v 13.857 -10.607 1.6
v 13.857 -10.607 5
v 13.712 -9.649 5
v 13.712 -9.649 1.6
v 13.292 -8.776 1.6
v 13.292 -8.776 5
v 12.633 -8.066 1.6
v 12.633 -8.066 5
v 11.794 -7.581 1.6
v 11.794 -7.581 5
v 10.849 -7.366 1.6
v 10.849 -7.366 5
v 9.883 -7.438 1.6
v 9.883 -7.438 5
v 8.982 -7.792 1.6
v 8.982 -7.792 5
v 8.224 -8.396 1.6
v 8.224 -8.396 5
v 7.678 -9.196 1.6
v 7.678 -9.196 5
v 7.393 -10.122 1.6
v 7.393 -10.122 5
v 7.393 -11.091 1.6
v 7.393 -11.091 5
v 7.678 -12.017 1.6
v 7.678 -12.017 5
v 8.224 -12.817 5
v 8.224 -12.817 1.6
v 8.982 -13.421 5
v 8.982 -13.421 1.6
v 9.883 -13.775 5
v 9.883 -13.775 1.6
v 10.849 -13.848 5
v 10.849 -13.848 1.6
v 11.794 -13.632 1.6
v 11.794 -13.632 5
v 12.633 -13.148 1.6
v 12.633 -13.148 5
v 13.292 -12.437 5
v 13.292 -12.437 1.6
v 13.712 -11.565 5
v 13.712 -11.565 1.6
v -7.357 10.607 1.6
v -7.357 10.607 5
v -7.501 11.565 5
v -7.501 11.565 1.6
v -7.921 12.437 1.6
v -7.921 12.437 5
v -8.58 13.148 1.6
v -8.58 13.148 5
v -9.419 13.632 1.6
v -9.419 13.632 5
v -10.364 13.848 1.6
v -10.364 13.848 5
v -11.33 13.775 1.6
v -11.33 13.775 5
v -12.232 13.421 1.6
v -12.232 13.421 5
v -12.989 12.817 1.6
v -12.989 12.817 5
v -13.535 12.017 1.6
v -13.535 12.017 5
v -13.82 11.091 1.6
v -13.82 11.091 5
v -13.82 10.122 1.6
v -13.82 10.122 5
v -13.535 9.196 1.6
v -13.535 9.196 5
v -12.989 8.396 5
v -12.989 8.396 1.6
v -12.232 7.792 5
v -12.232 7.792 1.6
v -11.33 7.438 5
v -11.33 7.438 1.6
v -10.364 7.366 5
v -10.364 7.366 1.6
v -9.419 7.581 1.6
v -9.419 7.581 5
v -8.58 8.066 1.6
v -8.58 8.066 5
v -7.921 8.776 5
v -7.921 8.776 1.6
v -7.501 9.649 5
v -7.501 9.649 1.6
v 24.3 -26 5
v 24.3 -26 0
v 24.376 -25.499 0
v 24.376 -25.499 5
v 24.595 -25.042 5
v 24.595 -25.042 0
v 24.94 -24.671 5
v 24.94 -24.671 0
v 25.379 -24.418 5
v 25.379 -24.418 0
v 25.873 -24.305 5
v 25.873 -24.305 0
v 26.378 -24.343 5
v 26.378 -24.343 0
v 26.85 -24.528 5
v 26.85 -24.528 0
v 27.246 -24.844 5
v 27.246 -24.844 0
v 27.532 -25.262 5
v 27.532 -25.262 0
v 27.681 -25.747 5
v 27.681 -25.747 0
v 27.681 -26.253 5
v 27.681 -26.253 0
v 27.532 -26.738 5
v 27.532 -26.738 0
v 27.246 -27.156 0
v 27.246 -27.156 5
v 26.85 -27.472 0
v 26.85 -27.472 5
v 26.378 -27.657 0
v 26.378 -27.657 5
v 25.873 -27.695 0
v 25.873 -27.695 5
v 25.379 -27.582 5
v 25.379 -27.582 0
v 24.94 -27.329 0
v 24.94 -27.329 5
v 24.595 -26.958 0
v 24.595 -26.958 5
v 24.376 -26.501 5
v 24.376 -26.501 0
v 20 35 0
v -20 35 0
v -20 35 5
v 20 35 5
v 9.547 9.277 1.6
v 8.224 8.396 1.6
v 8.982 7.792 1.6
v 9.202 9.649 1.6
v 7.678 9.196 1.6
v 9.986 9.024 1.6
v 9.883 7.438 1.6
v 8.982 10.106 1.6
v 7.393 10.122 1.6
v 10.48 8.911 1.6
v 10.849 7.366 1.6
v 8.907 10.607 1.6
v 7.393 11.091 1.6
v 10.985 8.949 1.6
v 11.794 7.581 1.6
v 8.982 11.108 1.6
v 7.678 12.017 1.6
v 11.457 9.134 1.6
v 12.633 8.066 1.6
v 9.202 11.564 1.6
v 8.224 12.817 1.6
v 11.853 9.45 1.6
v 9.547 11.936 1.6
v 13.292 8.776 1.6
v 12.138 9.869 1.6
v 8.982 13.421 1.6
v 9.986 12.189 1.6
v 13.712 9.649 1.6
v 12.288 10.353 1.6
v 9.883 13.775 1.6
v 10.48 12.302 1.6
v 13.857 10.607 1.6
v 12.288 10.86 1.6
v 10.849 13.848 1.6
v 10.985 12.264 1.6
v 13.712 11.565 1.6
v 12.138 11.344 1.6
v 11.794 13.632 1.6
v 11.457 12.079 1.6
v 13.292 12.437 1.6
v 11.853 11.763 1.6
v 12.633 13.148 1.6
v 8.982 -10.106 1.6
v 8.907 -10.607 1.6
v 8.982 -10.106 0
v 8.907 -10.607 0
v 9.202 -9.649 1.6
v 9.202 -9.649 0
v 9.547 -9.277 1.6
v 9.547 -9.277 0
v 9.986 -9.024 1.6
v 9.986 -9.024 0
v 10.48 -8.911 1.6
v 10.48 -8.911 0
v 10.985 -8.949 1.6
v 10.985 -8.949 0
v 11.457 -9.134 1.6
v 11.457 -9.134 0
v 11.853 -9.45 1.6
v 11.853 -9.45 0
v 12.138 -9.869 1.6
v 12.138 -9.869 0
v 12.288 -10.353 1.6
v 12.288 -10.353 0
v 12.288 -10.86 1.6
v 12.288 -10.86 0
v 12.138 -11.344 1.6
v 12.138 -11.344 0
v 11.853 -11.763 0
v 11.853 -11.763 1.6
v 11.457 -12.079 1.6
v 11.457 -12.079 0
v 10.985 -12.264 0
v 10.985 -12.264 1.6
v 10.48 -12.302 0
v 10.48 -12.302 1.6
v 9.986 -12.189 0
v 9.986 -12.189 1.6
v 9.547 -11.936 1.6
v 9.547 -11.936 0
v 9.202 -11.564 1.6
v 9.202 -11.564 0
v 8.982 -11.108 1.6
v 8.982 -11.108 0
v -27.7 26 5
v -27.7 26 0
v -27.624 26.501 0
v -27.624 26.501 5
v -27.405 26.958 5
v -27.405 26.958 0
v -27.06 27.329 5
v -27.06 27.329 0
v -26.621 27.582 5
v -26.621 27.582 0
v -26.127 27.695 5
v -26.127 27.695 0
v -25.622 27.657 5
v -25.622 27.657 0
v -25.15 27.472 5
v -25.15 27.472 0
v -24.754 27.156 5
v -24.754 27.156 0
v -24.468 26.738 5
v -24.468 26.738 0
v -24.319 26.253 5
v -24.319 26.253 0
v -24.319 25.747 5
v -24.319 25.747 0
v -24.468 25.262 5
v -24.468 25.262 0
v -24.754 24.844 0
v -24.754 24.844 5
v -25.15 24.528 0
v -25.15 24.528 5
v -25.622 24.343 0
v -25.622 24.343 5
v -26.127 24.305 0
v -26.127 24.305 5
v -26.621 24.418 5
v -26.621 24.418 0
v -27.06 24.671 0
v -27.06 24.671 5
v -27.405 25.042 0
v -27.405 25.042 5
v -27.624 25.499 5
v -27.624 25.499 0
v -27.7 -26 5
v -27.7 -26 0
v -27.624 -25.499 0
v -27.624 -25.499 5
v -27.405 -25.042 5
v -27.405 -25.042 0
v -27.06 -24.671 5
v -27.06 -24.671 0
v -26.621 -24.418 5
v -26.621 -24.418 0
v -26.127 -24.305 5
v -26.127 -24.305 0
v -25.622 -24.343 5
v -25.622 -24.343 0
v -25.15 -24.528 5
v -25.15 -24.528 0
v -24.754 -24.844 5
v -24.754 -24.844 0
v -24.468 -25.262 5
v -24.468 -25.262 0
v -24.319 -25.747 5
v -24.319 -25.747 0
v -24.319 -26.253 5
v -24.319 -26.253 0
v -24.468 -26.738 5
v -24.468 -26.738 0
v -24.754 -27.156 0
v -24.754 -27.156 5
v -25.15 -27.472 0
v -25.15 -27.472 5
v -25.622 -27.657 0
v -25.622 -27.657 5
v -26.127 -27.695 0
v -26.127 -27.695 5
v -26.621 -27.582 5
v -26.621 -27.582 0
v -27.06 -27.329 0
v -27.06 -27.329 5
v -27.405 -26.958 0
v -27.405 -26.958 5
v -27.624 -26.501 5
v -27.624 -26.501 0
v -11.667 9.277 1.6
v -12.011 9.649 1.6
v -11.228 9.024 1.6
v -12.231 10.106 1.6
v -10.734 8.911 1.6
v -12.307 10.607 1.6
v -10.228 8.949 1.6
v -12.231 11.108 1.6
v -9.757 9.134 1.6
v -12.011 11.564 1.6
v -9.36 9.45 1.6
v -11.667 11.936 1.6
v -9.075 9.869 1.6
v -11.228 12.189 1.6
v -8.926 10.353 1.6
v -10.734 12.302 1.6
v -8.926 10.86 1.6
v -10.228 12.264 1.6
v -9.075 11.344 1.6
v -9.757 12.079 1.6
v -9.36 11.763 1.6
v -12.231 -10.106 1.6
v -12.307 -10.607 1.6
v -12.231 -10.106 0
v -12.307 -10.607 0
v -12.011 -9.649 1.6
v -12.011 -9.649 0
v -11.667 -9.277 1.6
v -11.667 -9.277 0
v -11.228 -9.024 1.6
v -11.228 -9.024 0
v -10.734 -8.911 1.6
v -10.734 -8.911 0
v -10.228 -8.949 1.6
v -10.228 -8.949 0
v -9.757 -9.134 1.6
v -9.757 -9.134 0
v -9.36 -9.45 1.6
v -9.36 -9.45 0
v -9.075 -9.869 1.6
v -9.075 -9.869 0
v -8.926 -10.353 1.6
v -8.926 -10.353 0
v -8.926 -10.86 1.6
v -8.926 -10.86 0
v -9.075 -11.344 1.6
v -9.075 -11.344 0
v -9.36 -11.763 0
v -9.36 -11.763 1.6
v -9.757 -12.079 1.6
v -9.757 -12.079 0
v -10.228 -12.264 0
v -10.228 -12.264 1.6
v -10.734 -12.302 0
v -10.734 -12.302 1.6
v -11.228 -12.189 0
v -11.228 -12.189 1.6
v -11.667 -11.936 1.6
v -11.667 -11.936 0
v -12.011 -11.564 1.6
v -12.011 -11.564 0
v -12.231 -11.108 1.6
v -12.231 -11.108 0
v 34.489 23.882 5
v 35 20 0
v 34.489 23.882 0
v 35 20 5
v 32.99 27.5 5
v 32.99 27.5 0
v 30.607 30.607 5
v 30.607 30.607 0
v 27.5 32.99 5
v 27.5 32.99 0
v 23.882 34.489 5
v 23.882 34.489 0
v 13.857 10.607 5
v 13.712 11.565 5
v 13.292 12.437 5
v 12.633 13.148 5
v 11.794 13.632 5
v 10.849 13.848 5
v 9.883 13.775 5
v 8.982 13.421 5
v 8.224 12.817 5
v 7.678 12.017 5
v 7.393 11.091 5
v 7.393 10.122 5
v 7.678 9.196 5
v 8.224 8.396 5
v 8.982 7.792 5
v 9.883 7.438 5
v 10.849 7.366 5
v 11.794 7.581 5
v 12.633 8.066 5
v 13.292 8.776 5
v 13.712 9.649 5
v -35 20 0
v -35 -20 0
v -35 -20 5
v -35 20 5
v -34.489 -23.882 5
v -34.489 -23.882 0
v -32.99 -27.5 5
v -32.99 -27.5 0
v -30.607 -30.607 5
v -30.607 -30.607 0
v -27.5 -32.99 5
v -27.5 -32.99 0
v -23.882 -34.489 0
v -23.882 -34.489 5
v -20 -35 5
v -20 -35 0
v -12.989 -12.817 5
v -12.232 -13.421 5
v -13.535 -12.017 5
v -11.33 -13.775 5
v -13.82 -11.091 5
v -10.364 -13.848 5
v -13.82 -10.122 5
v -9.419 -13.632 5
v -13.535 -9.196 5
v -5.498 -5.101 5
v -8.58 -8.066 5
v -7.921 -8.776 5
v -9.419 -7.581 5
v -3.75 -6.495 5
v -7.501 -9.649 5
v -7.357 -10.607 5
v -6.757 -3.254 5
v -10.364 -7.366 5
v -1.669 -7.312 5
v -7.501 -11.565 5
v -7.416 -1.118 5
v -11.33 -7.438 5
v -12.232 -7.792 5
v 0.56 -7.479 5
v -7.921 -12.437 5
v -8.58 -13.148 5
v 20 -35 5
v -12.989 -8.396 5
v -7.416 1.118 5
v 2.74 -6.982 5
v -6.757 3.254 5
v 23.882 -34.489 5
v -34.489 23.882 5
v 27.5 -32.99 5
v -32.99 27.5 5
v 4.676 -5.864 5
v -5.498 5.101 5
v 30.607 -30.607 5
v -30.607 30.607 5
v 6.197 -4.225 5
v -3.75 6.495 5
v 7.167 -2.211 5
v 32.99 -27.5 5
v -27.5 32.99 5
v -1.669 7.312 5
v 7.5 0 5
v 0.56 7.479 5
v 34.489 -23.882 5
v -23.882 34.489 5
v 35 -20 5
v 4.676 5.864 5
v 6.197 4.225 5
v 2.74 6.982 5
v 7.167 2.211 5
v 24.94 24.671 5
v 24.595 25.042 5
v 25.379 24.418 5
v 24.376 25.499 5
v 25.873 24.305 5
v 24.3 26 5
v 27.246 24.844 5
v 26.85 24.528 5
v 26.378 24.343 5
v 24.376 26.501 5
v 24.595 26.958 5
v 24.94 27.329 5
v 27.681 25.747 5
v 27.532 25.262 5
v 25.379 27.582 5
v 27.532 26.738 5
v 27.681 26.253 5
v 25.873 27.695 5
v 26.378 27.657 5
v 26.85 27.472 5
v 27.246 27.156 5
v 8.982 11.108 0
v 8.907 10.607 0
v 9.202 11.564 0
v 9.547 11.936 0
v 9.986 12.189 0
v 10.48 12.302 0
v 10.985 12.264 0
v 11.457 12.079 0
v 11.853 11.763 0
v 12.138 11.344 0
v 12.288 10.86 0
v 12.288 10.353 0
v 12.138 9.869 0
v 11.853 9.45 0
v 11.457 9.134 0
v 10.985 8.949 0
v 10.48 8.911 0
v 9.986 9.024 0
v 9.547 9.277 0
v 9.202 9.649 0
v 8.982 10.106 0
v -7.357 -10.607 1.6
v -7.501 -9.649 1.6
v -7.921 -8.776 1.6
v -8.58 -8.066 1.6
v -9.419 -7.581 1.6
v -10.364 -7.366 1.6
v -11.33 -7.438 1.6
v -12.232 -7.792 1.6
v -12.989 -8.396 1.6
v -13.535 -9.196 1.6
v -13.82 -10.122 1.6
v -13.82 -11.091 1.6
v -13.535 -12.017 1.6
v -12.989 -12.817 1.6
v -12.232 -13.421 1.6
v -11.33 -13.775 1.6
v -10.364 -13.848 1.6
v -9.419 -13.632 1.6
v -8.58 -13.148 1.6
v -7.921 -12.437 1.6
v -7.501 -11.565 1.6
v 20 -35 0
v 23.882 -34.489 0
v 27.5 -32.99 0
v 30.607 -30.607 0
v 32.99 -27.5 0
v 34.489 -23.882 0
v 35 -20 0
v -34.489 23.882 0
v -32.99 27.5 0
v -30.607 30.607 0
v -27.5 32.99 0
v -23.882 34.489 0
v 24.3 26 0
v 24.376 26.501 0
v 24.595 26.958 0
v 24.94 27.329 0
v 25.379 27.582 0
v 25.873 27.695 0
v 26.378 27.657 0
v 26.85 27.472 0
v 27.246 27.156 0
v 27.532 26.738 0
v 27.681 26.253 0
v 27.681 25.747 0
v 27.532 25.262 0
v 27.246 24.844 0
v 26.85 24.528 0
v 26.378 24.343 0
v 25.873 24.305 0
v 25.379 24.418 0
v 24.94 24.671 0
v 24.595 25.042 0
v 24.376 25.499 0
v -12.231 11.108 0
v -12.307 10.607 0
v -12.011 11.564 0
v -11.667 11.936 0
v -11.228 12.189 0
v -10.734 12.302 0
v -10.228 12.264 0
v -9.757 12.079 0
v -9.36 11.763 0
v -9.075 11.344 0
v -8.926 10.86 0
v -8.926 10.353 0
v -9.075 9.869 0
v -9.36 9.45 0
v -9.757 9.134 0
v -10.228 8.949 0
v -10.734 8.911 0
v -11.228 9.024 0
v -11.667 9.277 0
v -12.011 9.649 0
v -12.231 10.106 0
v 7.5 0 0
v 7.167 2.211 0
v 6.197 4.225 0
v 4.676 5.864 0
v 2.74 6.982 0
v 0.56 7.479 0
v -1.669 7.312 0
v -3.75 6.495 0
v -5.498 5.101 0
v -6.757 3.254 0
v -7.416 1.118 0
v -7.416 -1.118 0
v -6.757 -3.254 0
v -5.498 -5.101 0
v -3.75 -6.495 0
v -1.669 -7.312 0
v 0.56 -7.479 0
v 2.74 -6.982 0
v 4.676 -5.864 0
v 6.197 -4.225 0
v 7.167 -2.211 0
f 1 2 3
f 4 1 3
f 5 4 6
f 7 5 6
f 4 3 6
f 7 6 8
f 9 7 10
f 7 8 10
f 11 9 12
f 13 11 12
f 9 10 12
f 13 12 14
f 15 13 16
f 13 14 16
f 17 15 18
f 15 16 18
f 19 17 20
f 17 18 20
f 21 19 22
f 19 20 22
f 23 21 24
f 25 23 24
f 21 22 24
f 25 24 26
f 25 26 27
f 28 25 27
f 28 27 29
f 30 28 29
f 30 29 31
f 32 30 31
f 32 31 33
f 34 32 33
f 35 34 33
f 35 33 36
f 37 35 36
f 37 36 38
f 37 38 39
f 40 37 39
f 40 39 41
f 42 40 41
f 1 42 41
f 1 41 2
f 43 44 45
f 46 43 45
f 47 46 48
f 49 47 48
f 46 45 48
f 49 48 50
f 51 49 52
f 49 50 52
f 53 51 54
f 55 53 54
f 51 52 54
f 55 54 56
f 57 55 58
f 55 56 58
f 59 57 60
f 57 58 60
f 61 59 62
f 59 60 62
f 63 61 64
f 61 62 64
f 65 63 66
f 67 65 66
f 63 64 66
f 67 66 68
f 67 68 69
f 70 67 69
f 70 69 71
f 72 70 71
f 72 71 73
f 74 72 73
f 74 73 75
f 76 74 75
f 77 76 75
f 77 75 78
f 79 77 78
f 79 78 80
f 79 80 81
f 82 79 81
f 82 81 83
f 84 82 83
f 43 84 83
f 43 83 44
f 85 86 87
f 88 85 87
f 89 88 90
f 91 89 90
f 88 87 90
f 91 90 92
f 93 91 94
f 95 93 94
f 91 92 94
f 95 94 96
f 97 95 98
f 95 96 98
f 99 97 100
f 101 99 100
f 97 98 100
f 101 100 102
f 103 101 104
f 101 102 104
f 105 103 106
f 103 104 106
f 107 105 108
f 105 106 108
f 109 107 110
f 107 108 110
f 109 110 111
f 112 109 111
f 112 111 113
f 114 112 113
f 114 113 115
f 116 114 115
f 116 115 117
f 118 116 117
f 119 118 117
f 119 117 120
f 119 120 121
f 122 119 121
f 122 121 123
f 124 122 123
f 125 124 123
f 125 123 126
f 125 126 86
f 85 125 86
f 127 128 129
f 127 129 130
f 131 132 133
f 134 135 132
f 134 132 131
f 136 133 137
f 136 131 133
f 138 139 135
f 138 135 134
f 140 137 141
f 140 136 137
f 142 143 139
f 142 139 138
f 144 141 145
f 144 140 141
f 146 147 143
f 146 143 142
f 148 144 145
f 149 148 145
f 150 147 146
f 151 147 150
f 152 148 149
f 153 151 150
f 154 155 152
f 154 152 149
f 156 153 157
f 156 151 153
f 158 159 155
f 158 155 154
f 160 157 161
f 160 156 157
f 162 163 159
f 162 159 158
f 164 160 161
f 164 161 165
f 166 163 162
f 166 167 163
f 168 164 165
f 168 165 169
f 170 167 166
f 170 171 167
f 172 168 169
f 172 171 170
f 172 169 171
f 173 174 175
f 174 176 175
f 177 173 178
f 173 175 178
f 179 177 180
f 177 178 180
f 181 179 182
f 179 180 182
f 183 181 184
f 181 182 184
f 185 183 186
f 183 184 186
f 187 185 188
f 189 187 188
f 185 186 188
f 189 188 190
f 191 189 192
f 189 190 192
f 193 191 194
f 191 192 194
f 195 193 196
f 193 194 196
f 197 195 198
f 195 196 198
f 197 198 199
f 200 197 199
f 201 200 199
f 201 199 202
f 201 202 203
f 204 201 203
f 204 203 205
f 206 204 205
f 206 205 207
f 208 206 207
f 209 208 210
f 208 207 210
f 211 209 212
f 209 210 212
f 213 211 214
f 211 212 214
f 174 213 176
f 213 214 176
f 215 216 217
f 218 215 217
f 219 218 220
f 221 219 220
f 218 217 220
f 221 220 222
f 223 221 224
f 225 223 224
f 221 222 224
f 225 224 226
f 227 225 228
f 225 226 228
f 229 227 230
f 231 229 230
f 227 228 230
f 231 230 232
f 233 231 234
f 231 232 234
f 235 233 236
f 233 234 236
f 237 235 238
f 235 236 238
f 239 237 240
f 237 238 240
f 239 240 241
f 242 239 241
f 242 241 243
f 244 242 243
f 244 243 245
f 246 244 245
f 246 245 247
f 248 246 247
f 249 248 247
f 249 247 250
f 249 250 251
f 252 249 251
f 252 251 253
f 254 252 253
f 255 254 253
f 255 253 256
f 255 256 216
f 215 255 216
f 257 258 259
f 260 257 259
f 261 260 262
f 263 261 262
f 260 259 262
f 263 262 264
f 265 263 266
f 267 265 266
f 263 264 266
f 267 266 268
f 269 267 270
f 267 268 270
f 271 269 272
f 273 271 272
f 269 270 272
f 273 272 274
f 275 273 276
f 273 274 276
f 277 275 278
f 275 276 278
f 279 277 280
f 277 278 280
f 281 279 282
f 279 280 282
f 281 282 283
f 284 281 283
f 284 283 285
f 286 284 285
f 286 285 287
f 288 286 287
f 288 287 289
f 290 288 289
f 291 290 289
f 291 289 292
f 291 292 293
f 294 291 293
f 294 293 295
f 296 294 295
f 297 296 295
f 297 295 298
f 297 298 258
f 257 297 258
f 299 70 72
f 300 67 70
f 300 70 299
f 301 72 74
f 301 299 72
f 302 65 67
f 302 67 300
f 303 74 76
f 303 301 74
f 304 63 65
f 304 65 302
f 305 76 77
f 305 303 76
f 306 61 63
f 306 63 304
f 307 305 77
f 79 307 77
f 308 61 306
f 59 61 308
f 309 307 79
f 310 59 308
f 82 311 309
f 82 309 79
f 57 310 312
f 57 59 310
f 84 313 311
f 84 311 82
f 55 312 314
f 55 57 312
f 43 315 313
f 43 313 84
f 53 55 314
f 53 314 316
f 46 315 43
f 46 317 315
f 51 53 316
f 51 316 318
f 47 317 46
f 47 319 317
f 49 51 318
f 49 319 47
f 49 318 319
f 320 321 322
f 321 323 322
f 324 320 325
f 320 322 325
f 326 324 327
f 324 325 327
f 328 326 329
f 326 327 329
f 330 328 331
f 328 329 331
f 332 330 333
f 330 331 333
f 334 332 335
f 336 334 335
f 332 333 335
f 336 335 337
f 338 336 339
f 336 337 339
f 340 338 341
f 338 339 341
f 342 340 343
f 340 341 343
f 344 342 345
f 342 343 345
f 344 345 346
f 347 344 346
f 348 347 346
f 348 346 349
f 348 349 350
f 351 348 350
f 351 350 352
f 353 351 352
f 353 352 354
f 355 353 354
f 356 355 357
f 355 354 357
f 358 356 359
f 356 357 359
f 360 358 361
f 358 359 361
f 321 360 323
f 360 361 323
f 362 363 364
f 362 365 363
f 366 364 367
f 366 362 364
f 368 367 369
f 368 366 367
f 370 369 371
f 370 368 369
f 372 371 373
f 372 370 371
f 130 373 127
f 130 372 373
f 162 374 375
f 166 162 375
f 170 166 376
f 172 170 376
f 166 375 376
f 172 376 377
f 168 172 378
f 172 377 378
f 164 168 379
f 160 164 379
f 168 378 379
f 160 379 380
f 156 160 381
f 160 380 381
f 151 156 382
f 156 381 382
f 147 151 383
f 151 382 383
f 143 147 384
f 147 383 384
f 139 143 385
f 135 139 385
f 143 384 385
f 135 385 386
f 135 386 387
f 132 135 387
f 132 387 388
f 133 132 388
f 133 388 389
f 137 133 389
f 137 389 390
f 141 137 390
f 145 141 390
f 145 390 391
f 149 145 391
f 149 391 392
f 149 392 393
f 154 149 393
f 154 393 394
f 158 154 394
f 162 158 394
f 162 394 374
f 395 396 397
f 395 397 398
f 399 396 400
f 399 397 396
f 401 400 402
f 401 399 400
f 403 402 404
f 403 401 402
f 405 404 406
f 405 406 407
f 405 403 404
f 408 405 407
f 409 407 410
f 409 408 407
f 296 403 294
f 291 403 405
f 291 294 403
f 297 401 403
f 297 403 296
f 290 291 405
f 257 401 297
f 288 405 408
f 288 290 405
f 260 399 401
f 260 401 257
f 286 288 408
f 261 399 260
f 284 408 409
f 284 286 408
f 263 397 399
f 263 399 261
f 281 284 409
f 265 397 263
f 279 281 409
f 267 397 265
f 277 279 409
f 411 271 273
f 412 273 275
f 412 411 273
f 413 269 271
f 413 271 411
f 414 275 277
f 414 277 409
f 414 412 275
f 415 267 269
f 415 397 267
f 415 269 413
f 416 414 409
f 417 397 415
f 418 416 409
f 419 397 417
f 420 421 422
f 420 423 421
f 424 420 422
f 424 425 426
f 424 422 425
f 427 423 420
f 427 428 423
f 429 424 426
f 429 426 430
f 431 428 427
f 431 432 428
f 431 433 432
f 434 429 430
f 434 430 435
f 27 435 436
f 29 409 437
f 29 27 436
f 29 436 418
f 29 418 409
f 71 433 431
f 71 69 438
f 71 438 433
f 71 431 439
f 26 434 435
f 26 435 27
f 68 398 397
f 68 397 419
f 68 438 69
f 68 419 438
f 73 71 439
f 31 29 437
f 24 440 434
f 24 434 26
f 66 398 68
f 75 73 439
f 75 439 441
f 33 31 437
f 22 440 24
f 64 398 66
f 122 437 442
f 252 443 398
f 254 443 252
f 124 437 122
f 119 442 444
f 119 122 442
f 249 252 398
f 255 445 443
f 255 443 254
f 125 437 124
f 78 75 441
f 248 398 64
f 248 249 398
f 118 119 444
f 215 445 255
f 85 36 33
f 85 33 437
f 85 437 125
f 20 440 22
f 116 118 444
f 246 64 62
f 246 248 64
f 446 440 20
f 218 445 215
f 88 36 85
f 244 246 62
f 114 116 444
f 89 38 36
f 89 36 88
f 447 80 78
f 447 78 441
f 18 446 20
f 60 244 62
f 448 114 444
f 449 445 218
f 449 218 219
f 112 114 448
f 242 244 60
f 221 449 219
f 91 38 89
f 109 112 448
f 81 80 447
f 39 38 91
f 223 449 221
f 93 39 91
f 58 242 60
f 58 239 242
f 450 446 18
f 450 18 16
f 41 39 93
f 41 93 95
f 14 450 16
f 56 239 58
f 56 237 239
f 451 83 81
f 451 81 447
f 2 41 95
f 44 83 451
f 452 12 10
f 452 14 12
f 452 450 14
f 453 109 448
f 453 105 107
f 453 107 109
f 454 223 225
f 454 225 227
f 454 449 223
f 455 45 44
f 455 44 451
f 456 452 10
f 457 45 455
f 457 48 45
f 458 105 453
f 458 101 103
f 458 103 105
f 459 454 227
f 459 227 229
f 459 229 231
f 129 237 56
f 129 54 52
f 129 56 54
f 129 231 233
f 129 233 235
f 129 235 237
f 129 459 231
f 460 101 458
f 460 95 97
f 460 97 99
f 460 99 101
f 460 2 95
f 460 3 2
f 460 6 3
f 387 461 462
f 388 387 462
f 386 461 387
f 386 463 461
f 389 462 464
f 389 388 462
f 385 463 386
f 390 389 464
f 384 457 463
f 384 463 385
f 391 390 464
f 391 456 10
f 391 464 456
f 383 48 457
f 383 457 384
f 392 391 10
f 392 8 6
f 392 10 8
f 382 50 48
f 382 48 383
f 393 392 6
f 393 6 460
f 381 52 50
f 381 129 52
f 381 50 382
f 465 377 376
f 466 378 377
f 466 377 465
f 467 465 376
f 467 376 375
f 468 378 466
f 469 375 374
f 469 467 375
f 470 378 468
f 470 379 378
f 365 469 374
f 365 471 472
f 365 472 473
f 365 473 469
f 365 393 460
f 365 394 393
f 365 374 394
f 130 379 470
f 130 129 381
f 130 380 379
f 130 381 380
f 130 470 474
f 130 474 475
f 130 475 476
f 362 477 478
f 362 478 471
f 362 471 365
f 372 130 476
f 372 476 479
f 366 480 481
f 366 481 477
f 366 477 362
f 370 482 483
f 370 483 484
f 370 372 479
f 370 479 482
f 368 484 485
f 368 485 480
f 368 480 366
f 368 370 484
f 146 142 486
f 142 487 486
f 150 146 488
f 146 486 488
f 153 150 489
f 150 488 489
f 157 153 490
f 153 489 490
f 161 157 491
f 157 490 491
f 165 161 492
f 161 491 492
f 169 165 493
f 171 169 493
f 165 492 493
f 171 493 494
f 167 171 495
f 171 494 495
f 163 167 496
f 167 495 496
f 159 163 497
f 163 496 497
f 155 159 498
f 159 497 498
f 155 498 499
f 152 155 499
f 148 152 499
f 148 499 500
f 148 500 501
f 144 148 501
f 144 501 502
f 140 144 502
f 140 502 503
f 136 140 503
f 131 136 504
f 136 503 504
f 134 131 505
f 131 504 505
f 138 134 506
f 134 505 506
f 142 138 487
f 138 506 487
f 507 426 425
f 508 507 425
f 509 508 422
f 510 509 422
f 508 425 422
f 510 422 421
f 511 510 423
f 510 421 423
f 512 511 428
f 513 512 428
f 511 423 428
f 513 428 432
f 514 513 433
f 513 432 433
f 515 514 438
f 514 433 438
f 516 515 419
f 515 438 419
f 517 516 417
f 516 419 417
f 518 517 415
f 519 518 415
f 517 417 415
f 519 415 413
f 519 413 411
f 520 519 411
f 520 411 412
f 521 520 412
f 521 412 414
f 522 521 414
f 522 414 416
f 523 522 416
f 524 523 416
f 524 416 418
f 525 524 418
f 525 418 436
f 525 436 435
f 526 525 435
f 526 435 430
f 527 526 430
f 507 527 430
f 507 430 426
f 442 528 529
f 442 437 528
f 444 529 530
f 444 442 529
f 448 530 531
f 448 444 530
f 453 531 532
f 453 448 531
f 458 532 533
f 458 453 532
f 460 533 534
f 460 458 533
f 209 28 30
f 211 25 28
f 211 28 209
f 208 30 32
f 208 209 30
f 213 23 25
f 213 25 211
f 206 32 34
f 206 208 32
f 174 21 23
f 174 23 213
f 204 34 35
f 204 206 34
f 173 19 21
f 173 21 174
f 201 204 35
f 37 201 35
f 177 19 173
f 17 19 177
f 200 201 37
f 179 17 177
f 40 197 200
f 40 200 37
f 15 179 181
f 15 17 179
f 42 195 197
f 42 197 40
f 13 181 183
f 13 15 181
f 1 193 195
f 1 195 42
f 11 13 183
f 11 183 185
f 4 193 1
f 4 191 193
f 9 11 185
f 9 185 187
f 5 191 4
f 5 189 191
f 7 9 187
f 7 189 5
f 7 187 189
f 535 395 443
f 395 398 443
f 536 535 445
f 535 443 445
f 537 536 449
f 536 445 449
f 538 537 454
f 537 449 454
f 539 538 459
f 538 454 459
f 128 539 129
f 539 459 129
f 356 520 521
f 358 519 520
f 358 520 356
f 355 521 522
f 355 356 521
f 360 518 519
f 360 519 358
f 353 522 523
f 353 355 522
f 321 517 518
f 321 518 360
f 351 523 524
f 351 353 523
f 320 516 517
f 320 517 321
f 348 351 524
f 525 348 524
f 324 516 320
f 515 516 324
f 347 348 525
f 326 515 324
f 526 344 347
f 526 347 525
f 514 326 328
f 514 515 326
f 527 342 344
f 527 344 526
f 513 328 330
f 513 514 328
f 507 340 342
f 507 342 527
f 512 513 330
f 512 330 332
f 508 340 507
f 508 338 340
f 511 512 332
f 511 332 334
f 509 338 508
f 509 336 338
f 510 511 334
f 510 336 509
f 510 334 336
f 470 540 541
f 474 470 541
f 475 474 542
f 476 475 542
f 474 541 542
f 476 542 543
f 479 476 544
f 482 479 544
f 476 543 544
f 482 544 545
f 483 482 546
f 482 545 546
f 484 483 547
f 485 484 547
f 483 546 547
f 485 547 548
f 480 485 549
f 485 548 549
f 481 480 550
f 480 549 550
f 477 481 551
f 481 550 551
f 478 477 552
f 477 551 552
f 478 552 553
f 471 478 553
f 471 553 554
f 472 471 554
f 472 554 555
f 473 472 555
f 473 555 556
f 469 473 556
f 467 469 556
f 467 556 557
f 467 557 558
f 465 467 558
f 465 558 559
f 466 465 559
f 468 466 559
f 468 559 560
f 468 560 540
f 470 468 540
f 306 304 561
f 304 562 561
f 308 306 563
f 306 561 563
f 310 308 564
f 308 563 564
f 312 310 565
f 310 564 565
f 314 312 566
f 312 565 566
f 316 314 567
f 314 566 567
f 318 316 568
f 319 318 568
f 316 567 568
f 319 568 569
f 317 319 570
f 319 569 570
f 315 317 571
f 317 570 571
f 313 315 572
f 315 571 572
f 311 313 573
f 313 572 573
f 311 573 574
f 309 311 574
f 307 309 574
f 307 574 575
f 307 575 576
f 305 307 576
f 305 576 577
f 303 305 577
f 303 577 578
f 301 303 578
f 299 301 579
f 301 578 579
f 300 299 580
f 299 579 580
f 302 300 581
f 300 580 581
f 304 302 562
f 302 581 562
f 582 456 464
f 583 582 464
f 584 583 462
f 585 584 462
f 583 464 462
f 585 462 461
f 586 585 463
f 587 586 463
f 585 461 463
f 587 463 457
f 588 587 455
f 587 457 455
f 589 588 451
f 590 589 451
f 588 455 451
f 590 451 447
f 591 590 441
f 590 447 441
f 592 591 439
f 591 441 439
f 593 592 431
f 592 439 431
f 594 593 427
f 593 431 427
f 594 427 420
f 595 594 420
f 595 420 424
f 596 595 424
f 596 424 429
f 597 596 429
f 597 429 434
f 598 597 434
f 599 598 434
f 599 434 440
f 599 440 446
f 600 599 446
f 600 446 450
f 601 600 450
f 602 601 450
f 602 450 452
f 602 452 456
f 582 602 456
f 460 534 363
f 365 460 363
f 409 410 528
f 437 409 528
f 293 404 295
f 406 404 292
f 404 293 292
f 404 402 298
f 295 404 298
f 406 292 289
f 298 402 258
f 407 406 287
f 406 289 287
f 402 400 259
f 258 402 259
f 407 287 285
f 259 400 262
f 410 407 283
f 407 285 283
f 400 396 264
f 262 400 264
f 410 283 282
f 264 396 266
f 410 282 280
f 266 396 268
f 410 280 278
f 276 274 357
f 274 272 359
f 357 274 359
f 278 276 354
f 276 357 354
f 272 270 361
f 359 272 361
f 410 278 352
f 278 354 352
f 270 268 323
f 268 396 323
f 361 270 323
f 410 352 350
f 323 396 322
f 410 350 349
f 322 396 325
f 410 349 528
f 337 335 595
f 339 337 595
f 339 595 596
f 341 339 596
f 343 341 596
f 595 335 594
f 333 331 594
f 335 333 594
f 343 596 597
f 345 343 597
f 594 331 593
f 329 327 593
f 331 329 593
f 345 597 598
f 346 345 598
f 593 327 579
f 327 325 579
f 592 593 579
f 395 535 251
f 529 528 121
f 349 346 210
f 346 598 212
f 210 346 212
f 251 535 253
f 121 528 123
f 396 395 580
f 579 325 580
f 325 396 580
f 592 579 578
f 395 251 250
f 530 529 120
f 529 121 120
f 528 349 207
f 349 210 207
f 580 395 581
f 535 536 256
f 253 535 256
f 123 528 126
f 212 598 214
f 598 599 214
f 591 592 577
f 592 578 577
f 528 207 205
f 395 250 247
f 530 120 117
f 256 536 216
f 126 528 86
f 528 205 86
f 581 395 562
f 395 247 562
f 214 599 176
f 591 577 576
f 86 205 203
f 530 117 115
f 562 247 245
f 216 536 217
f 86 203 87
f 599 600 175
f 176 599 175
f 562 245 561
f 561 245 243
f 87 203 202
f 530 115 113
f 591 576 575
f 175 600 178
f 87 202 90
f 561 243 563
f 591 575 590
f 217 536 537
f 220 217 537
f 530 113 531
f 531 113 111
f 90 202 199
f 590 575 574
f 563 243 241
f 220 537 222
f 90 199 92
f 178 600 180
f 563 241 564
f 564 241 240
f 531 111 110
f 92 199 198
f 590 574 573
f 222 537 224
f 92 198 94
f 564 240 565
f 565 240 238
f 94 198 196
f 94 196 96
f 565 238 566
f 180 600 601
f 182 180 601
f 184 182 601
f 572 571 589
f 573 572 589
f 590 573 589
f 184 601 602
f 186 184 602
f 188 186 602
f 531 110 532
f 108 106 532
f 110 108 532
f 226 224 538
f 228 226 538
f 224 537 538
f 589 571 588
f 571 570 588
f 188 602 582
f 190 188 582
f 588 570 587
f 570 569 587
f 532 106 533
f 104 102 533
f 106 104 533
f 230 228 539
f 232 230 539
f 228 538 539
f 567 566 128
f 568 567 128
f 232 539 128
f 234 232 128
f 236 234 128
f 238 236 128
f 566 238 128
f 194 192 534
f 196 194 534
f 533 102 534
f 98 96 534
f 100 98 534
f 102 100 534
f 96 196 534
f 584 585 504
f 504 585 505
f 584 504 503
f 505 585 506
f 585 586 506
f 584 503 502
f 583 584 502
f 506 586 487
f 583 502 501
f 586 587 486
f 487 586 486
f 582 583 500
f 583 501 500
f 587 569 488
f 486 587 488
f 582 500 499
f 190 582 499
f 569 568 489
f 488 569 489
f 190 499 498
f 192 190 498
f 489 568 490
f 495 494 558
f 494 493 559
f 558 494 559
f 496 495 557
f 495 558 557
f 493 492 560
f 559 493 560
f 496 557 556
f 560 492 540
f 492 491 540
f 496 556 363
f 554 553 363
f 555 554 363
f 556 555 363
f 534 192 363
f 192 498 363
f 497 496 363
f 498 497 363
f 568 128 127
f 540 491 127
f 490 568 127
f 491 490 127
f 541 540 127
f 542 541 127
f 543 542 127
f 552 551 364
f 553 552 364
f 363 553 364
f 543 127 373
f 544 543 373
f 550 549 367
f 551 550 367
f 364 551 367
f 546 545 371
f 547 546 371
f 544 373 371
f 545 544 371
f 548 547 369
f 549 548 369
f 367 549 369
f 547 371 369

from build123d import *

# Parameters (mm, degrees)
SKETCH1_W                                           = 70
SKETCH1_H                                           = 70
BOSS_EXTRUDE1_DEPTH                                 = 5
FILLET1_R                                           = 15
CBORE_FOR_M3_HEX_SOCKET_HEAD_CAP_SCREW1_D           = 3.4
CBORE_FOR_M3_HEX_SOCKET_HEAD_CAP_SCREW1_CBORE_D     = 6.5
CBORE_FOR_M3_HEX_SOCKET_HEAD_CAP_SCREW1_CBORE_DEPTH = 3.4
SKETCH5_R                                           = 7.5
CUT_EXTRUDE1_DEPTH                                  = 6
M3_CLEARANCE_HOLE1_D                                = 3.4


with BuildPart() as part:
    # Sketch1 → Boss-Extrude1 (new body)
    with BuildSketch(Plane.XY):
        Rectangle(SKETCH1_W, SKETCH1_H)
    extrude(amount=BOSS_EXTRUDE1_DEPTH)

    # Fillet1
    fillet1_edges = [part.edges().sort_by_distance(p)[0] for p in [
        (35, -35, 2.5),
        (-35, -35, 2.5),
        (-35, 35, 2.5),
        (35, 35, 2.5),
    ]]
    fillet(fillet1_edges, radius=FILLET1_R)

    # CBORE for M3 Hex Socket Head Cap Screw1 (through all)
    with Locations(Plane.XY.offset(5)):
        with Locations((-10.606601718, -10.606601718), (-10.606601718, 10.606601718), (10.606601718, 10.606601718), (10.606601718, -10.606601718)):
            CounterBoreHole(CBORE_FOR_M3_HEX_SOCKET_HEAD_CAP_SCREW1_D / 2, CBORE_FOR_M3_HEX_SOCKET_HEAD_CAP_SCREW1_CBORE_D / 2, CBORE_FOR_M3_HEX_SOCKET_HEAD_CAP_SCREW1_CBORE_DEPTH)

    # Sketch5 → Cut-Extrude1 (cut, through all)
    with BuildSketch(Plane.XY.offset(5)):
        Circle(SKETCH5_R)
    extrude(amount=-CUT_EXTRUDE1_DEPTH, mode=Mode.SUBTRACT)

    # M3 Clearance Hole1 (through all)
    with Locations(Plane.XY.offset(5)):
        with Locations((26, 26), (-26, 26), (-26, -26), (26, -26)):
            Hole(M3_CLEARANCE_HOLE1_D / 2)


solid = part.part
